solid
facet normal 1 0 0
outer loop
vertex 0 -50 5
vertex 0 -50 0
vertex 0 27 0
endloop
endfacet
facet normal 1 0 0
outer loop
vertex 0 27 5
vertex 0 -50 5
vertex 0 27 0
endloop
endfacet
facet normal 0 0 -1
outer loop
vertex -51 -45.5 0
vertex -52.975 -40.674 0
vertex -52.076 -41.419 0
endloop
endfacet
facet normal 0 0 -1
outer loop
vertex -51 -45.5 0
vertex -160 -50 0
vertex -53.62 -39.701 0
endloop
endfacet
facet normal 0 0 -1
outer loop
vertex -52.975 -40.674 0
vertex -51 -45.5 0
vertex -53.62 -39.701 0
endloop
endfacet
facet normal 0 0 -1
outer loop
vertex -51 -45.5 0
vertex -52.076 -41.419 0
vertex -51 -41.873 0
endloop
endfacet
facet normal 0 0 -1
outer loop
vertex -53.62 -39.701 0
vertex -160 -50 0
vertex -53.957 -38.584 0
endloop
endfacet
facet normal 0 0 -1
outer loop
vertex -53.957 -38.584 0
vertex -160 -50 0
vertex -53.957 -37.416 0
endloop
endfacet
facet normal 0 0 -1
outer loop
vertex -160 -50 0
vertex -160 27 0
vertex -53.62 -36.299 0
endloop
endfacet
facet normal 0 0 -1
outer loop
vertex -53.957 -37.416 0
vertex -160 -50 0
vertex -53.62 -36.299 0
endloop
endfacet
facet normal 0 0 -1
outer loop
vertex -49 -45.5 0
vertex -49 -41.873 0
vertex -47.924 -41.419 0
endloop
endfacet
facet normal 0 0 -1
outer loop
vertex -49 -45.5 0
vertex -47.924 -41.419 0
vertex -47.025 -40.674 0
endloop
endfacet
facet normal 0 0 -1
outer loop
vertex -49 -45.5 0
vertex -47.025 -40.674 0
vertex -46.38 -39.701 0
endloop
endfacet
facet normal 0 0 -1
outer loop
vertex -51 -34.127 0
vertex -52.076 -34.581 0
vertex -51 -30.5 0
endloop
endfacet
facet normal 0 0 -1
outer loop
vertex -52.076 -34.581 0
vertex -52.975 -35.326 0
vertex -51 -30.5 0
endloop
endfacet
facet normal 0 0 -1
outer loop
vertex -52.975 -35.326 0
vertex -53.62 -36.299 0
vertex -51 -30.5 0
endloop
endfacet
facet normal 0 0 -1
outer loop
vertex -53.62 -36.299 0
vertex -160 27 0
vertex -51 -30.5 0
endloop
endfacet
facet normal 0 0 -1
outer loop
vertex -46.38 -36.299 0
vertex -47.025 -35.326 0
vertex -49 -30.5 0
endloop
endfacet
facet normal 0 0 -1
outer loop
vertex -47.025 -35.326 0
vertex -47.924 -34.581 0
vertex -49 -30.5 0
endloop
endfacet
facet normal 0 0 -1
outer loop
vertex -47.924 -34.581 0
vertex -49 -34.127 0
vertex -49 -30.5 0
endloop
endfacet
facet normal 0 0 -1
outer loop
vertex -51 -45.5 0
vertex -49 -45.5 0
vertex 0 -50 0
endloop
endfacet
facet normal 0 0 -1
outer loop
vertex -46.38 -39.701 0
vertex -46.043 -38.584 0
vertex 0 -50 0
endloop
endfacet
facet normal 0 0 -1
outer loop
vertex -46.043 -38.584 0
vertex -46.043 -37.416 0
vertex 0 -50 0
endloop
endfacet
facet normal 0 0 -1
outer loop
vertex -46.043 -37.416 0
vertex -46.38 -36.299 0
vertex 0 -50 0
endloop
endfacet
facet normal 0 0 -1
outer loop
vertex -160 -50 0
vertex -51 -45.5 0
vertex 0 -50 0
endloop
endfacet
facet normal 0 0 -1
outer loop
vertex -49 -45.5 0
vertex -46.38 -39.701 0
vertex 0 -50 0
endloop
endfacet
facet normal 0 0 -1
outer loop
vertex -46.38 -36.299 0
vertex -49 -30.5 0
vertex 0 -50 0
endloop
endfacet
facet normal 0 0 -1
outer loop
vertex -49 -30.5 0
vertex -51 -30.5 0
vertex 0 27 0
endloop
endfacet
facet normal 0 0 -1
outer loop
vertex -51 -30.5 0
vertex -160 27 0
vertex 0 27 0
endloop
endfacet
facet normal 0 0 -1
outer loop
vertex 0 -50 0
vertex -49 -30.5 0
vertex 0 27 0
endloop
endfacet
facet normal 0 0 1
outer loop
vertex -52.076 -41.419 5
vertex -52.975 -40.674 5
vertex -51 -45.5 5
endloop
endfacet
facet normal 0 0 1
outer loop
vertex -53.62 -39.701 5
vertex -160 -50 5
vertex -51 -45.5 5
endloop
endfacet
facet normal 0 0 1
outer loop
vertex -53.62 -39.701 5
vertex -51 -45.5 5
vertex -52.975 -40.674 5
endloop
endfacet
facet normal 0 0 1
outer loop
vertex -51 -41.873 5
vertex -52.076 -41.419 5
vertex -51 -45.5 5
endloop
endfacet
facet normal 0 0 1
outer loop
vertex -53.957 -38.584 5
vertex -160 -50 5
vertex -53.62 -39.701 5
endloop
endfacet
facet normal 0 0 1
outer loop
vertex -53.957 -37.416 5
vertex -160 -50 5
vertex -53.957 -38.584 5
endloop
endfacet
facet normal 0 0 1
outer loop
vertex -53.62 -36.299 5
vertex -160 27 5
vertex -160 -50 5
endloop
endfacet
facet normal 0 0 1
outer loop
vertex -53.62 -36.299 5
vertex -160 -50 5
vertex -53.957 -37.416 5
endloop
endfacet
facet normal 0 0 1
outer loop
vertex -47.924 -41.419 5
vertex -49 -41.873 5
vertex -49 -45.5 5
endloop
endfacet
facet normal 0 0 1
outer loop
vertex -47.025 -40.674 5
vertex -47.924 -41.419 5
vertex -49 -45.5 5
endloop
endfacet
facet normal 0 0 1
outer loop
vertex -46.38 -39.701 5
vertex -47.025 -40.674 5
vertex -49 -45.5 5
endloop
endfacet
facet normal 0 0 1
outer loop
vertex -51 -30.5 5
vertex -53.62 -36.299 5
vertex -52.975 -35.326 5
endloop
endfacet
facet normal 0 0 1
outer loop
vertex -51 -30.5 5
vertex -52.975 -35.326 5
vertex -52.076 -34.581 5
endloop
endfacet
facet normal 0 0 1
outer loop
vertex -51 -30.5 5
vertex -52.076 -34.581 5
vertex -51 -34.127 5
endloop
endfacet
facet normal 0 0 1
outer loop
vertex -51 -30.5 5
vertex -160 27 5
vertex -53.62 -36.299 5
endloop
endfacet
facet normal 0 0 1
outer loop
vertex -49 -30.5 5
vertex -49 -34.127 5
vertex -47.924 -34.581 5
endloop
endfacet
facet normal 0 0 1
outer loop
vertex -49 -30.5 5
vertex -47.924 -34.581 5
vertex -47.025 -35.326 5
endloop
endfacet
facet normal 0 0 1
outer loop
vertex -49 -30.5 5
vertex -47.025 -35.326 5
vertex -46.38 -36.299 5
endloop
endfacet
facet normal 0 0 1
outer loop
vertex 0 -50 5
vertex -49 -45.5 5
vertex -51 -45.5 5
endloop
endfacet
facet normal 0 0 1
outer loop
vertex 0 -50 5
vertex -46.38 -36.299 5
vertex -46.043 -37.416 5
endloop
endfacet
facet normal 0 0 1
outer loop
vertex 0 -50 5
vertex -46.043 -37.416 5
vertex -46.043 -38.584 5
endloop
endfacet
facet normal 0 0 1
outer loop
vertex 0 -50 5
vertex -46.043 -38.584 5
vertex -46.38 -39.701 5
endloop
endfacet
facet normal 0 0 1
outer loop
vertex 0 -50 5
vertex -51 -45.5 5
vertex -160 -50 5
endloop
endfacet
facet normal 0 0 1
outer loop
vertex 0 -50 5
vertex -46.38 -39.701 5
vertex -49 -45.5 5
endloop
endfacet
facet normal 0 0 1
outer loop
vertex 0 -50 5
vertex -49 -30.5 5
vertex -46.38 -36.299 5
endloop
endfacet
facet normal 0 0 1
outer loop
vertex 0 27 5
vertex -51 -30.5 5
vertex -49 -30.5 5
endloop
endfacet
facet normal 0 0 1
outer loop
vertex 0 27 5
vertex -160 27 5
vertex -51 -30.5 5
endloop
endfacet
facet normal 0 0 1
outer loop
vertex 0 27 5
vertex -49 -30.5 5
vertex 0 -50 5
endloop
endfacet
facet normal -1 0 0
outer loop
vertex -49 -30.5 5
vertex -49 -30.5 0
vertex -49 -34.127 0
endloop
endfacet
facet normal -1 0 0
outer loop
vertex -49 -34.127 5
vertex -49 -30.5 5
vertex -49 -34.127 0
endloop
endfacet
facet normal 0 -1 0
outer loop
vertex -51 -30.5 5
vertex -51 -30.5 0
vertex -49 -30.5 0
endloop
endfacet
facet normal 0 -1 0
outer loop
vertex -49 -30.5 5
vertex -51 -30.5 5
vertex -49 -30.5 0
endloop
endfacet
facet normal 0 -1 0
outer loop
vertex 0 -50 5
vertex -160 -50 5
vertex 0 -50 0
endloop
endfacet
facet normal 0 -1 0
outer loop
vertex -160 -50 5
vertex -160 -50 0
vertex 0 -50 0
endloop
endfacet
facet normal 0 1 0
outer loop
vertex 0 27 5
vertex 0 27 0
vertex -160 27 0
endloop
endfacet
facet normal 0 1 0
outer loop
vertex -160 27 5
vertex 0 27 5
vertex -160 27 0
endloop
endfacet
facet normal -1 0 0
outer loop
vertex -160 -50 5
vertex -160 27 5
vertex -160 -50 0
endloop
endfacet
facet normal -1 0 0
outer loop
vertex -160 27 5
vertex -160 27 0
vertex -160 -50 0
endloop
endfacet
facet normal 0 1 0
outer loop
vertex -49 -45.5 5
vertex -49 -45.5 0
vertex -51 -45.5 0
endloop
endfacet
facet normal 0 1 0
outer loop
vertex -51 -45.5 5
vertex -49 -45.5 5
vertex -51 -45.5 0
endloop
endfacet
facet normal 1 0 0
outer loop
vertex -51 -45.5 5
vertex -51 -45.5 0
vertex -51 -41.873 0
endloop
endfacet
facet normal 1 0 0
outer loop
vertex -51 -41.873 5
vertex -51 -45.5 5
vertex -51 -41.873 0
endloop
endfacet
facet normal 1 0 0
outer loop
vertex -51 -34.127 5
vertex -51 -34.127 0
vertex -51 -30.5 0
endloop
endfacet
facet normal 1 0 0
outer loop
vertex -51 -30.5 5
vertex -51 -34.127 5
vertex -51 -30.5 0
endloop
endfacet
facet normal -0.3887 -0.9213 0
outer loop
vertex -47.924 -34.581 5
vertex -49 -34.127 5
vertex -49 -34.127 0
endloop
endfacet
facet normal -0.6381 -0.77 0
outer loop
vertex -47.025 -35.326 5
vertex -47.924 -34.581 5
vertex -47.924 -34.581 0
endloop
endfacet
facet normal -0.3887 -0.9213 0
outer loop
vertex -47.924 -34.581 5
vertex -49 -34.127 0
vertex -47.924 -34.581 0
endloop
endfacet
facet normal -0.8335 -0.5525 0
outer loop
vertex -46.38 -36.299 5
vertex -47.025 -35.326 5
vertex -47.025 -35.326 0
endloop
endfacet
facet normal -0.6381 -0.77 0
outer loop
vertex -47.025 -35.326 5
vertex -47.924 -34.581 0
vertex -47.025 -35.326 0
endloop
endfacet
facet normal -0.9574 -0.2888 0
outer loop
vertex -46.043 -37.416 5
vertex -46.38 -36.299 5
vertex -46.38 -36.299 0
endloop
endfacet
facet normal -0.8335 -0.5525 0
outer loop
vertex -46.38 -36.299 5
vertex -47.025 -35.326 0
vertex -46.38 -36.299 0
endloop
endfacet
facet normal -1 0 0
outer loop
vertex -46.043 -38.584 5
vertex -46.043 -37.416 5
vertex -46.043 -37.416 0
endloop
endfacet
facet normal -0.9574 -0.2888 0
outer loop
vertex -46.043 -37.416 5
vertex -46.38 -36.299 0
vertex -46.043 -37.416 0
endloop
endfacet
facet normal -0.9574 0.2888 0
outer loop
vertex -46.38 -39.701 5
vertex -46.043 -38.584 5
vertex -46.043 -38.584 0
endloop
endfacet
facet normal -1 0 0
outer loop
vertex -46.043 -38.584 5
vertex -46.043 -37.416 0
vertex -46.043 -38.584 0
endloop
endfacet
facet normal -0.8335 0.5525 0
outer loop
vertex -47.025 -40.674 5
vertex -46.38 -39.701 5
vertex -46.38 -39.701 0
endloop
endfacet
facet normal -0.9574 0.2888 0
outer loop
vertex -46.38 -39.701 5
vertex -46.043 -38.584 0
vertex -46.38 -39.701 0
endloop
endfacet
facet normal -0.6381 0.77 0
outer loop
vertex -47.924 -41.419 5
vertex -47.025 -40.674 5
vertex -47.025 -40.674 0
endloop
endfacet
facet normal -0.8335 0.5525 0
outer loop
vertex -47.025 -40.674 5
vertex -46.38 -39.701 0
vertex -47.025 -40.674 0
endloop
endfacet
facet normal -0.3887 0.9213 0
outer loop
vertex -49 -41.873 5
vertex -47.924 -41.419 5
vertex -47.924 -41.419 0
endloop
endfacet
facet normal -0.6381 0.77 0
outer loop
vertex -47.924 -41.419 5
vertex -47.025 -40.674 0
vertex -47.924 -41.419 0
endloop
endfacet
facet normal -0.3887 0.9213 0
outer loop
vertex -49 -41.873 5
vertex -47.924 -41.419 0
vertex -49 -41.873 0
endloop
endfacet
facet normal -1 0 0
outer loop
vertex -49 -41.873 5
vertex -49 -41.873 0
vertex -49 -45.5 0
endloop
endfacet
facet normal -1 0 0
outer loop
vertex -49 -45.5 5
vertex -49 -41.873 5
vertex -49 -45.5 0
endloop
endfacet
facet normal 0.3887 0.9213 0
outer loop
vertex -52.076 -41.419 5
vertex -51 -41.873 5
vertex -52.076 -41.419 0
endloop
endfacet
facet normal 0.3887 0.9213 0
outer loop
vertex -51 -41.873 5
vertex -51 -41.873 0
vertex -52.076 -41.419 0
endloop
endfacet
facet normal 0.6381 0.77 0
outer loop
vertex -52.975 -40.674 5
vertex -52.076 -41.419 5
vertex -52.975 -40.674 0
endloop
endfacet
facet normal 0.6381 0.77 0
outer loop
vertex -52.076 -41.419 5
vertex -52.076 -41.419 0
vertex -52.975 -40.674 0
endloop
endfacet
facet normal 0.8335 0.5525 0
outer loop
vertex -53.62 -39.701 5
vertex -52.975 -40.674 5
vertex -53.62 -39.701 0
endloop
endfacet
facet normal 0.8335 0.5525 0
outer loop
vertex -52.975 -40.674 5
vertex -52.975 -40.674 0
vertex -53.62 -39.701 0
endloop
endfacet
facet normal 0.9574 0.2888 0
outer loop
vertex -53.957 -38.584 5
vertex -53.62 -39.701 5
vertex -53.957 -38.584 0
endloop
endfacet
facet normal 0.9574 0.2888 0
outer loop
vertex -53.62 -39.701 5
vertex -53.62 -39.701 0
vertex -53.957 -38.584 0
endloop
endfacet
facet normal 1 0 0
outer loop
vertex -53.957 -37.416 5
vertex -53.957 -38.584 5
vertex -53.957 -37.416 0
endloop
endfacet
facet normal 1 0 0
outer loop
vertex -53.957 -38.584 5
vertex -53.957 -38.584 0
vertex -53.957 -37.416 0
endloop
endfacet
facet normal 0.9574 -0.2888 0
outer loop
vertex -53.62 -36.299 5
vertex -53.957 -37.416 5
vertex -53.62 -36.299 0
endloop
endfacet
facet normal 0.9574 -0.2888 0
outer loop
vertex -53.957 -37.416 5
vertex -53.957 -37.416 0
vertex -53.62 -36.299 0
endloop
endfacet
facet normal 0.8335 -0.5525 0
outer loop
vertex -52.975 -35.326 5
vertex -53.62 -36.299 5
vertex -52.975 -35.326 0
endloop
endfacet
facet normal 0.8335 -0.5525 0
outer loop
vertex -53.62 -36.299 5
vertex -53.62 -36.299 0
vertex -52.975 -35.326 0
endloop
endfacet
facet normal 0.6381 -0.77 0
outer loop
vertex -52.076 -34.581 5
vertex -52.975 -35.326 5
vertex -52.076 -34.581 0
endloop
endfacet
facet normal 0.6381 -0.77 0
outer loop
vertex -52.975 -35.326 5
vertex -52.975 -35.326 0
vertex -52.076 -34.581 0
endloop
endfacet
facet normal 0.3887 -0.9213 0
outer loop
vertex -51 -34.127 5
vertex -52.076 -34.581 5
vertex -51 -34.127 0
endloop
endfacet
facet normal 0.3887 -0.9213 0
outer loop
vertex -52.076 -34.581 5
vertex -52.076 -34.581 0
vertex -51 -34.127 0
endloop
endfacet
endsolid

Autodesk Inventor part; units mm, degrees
ref_plane "YZ Plane" through (0, 0, 0) normal (1, 0, 0) x (0, 1, 0)
ref_plane "XZ Plane" through (0, 0, 0) normal (0, 1, 0) x (-1, 0, 0)
ref_plane "XY Plane" through (0, 0, 0) normal (0, 0, 1) x (1, 0, 0)
sketch "Sketch1" plane through (0, 0, 0) normal (0, 0, 1) x (1, 0, 0)
  line L0 (0, 0) -> (-170, 0)
  line L1 (-170, 0) -> (-170, -50)
  line L2 (-170, -50) -> (0, -50)
  line L3 (0, -50) -> (0, 0)
  line L4 (0, 0) -> (-43.459, 0)
  line L5 (-43.459, 0) -> (-43.459, -8)
  line L6 (-43.459, -8) -> (0, -8)
  line L7 (0, -8) -> (0, 0)
  line L8 (0, 0) -> (-170, 0)
  line L9 (-170, 0) -> (-170, 27)
  line L10 (-170, 27) -> (0, 27)
  line L11 (0, 27) -> (0, 0)
  circle A0 centre (-50, -38) radius 4
  line L12 (-51, -30.5) -> (-49, -30.5)
  line L13 (-49, -30.5) -> (-49, -45.5)
  line L14 (-49, -45.5) -> (-51, -45.5)
  line L15 (-51, -45.5) -> (-51, -30.5)
  line L16 (-50, -38) -> (-50, -42) construction
  line L17 (-51, -38) -> (-50, -38) construction
  point P0 (-51, -34.127)
  point P1 (-51, -41.873)
  point P2 (-49, -34.127)
  point P3 (-49, -41.873)
  dimension "d10" = 8
  dimension "d0" = 43.459
  dimension "d1" = 8
  dimension "d2" = 27
  dimension "d3" = 42
  dimension "d4" = 170
  dimension "d8" = 30
  dimension "d9" = 50
  dimension "d11" = 15
  dimension "d12" = 2
sketch "Sketch2" plane through (0, 0, 0) normal (0, 0, 1) x (1, 0, 0)
  line L0 (0, 27) -> (-160, 27)
  line L1 (-160, 27) -> (-160, -50)
  line L2 (-160, -50) -> (0, -50)
  line L3 (0, -50) -> (0, 27)
  point P0 (0, 0)
  dimension "d5" = 160
extrude "Extrusion1" add sketch "Sketch2" along normal blind 5
extrude "Extrusion2" cut sketch "Sketch1" along normal through all contours A0 L13 | L13 A0 L15 | A0 L15 L12 L13 | L13 L14 L15 A0 | L15 A0
properties part number "Inkpath_Plate"
